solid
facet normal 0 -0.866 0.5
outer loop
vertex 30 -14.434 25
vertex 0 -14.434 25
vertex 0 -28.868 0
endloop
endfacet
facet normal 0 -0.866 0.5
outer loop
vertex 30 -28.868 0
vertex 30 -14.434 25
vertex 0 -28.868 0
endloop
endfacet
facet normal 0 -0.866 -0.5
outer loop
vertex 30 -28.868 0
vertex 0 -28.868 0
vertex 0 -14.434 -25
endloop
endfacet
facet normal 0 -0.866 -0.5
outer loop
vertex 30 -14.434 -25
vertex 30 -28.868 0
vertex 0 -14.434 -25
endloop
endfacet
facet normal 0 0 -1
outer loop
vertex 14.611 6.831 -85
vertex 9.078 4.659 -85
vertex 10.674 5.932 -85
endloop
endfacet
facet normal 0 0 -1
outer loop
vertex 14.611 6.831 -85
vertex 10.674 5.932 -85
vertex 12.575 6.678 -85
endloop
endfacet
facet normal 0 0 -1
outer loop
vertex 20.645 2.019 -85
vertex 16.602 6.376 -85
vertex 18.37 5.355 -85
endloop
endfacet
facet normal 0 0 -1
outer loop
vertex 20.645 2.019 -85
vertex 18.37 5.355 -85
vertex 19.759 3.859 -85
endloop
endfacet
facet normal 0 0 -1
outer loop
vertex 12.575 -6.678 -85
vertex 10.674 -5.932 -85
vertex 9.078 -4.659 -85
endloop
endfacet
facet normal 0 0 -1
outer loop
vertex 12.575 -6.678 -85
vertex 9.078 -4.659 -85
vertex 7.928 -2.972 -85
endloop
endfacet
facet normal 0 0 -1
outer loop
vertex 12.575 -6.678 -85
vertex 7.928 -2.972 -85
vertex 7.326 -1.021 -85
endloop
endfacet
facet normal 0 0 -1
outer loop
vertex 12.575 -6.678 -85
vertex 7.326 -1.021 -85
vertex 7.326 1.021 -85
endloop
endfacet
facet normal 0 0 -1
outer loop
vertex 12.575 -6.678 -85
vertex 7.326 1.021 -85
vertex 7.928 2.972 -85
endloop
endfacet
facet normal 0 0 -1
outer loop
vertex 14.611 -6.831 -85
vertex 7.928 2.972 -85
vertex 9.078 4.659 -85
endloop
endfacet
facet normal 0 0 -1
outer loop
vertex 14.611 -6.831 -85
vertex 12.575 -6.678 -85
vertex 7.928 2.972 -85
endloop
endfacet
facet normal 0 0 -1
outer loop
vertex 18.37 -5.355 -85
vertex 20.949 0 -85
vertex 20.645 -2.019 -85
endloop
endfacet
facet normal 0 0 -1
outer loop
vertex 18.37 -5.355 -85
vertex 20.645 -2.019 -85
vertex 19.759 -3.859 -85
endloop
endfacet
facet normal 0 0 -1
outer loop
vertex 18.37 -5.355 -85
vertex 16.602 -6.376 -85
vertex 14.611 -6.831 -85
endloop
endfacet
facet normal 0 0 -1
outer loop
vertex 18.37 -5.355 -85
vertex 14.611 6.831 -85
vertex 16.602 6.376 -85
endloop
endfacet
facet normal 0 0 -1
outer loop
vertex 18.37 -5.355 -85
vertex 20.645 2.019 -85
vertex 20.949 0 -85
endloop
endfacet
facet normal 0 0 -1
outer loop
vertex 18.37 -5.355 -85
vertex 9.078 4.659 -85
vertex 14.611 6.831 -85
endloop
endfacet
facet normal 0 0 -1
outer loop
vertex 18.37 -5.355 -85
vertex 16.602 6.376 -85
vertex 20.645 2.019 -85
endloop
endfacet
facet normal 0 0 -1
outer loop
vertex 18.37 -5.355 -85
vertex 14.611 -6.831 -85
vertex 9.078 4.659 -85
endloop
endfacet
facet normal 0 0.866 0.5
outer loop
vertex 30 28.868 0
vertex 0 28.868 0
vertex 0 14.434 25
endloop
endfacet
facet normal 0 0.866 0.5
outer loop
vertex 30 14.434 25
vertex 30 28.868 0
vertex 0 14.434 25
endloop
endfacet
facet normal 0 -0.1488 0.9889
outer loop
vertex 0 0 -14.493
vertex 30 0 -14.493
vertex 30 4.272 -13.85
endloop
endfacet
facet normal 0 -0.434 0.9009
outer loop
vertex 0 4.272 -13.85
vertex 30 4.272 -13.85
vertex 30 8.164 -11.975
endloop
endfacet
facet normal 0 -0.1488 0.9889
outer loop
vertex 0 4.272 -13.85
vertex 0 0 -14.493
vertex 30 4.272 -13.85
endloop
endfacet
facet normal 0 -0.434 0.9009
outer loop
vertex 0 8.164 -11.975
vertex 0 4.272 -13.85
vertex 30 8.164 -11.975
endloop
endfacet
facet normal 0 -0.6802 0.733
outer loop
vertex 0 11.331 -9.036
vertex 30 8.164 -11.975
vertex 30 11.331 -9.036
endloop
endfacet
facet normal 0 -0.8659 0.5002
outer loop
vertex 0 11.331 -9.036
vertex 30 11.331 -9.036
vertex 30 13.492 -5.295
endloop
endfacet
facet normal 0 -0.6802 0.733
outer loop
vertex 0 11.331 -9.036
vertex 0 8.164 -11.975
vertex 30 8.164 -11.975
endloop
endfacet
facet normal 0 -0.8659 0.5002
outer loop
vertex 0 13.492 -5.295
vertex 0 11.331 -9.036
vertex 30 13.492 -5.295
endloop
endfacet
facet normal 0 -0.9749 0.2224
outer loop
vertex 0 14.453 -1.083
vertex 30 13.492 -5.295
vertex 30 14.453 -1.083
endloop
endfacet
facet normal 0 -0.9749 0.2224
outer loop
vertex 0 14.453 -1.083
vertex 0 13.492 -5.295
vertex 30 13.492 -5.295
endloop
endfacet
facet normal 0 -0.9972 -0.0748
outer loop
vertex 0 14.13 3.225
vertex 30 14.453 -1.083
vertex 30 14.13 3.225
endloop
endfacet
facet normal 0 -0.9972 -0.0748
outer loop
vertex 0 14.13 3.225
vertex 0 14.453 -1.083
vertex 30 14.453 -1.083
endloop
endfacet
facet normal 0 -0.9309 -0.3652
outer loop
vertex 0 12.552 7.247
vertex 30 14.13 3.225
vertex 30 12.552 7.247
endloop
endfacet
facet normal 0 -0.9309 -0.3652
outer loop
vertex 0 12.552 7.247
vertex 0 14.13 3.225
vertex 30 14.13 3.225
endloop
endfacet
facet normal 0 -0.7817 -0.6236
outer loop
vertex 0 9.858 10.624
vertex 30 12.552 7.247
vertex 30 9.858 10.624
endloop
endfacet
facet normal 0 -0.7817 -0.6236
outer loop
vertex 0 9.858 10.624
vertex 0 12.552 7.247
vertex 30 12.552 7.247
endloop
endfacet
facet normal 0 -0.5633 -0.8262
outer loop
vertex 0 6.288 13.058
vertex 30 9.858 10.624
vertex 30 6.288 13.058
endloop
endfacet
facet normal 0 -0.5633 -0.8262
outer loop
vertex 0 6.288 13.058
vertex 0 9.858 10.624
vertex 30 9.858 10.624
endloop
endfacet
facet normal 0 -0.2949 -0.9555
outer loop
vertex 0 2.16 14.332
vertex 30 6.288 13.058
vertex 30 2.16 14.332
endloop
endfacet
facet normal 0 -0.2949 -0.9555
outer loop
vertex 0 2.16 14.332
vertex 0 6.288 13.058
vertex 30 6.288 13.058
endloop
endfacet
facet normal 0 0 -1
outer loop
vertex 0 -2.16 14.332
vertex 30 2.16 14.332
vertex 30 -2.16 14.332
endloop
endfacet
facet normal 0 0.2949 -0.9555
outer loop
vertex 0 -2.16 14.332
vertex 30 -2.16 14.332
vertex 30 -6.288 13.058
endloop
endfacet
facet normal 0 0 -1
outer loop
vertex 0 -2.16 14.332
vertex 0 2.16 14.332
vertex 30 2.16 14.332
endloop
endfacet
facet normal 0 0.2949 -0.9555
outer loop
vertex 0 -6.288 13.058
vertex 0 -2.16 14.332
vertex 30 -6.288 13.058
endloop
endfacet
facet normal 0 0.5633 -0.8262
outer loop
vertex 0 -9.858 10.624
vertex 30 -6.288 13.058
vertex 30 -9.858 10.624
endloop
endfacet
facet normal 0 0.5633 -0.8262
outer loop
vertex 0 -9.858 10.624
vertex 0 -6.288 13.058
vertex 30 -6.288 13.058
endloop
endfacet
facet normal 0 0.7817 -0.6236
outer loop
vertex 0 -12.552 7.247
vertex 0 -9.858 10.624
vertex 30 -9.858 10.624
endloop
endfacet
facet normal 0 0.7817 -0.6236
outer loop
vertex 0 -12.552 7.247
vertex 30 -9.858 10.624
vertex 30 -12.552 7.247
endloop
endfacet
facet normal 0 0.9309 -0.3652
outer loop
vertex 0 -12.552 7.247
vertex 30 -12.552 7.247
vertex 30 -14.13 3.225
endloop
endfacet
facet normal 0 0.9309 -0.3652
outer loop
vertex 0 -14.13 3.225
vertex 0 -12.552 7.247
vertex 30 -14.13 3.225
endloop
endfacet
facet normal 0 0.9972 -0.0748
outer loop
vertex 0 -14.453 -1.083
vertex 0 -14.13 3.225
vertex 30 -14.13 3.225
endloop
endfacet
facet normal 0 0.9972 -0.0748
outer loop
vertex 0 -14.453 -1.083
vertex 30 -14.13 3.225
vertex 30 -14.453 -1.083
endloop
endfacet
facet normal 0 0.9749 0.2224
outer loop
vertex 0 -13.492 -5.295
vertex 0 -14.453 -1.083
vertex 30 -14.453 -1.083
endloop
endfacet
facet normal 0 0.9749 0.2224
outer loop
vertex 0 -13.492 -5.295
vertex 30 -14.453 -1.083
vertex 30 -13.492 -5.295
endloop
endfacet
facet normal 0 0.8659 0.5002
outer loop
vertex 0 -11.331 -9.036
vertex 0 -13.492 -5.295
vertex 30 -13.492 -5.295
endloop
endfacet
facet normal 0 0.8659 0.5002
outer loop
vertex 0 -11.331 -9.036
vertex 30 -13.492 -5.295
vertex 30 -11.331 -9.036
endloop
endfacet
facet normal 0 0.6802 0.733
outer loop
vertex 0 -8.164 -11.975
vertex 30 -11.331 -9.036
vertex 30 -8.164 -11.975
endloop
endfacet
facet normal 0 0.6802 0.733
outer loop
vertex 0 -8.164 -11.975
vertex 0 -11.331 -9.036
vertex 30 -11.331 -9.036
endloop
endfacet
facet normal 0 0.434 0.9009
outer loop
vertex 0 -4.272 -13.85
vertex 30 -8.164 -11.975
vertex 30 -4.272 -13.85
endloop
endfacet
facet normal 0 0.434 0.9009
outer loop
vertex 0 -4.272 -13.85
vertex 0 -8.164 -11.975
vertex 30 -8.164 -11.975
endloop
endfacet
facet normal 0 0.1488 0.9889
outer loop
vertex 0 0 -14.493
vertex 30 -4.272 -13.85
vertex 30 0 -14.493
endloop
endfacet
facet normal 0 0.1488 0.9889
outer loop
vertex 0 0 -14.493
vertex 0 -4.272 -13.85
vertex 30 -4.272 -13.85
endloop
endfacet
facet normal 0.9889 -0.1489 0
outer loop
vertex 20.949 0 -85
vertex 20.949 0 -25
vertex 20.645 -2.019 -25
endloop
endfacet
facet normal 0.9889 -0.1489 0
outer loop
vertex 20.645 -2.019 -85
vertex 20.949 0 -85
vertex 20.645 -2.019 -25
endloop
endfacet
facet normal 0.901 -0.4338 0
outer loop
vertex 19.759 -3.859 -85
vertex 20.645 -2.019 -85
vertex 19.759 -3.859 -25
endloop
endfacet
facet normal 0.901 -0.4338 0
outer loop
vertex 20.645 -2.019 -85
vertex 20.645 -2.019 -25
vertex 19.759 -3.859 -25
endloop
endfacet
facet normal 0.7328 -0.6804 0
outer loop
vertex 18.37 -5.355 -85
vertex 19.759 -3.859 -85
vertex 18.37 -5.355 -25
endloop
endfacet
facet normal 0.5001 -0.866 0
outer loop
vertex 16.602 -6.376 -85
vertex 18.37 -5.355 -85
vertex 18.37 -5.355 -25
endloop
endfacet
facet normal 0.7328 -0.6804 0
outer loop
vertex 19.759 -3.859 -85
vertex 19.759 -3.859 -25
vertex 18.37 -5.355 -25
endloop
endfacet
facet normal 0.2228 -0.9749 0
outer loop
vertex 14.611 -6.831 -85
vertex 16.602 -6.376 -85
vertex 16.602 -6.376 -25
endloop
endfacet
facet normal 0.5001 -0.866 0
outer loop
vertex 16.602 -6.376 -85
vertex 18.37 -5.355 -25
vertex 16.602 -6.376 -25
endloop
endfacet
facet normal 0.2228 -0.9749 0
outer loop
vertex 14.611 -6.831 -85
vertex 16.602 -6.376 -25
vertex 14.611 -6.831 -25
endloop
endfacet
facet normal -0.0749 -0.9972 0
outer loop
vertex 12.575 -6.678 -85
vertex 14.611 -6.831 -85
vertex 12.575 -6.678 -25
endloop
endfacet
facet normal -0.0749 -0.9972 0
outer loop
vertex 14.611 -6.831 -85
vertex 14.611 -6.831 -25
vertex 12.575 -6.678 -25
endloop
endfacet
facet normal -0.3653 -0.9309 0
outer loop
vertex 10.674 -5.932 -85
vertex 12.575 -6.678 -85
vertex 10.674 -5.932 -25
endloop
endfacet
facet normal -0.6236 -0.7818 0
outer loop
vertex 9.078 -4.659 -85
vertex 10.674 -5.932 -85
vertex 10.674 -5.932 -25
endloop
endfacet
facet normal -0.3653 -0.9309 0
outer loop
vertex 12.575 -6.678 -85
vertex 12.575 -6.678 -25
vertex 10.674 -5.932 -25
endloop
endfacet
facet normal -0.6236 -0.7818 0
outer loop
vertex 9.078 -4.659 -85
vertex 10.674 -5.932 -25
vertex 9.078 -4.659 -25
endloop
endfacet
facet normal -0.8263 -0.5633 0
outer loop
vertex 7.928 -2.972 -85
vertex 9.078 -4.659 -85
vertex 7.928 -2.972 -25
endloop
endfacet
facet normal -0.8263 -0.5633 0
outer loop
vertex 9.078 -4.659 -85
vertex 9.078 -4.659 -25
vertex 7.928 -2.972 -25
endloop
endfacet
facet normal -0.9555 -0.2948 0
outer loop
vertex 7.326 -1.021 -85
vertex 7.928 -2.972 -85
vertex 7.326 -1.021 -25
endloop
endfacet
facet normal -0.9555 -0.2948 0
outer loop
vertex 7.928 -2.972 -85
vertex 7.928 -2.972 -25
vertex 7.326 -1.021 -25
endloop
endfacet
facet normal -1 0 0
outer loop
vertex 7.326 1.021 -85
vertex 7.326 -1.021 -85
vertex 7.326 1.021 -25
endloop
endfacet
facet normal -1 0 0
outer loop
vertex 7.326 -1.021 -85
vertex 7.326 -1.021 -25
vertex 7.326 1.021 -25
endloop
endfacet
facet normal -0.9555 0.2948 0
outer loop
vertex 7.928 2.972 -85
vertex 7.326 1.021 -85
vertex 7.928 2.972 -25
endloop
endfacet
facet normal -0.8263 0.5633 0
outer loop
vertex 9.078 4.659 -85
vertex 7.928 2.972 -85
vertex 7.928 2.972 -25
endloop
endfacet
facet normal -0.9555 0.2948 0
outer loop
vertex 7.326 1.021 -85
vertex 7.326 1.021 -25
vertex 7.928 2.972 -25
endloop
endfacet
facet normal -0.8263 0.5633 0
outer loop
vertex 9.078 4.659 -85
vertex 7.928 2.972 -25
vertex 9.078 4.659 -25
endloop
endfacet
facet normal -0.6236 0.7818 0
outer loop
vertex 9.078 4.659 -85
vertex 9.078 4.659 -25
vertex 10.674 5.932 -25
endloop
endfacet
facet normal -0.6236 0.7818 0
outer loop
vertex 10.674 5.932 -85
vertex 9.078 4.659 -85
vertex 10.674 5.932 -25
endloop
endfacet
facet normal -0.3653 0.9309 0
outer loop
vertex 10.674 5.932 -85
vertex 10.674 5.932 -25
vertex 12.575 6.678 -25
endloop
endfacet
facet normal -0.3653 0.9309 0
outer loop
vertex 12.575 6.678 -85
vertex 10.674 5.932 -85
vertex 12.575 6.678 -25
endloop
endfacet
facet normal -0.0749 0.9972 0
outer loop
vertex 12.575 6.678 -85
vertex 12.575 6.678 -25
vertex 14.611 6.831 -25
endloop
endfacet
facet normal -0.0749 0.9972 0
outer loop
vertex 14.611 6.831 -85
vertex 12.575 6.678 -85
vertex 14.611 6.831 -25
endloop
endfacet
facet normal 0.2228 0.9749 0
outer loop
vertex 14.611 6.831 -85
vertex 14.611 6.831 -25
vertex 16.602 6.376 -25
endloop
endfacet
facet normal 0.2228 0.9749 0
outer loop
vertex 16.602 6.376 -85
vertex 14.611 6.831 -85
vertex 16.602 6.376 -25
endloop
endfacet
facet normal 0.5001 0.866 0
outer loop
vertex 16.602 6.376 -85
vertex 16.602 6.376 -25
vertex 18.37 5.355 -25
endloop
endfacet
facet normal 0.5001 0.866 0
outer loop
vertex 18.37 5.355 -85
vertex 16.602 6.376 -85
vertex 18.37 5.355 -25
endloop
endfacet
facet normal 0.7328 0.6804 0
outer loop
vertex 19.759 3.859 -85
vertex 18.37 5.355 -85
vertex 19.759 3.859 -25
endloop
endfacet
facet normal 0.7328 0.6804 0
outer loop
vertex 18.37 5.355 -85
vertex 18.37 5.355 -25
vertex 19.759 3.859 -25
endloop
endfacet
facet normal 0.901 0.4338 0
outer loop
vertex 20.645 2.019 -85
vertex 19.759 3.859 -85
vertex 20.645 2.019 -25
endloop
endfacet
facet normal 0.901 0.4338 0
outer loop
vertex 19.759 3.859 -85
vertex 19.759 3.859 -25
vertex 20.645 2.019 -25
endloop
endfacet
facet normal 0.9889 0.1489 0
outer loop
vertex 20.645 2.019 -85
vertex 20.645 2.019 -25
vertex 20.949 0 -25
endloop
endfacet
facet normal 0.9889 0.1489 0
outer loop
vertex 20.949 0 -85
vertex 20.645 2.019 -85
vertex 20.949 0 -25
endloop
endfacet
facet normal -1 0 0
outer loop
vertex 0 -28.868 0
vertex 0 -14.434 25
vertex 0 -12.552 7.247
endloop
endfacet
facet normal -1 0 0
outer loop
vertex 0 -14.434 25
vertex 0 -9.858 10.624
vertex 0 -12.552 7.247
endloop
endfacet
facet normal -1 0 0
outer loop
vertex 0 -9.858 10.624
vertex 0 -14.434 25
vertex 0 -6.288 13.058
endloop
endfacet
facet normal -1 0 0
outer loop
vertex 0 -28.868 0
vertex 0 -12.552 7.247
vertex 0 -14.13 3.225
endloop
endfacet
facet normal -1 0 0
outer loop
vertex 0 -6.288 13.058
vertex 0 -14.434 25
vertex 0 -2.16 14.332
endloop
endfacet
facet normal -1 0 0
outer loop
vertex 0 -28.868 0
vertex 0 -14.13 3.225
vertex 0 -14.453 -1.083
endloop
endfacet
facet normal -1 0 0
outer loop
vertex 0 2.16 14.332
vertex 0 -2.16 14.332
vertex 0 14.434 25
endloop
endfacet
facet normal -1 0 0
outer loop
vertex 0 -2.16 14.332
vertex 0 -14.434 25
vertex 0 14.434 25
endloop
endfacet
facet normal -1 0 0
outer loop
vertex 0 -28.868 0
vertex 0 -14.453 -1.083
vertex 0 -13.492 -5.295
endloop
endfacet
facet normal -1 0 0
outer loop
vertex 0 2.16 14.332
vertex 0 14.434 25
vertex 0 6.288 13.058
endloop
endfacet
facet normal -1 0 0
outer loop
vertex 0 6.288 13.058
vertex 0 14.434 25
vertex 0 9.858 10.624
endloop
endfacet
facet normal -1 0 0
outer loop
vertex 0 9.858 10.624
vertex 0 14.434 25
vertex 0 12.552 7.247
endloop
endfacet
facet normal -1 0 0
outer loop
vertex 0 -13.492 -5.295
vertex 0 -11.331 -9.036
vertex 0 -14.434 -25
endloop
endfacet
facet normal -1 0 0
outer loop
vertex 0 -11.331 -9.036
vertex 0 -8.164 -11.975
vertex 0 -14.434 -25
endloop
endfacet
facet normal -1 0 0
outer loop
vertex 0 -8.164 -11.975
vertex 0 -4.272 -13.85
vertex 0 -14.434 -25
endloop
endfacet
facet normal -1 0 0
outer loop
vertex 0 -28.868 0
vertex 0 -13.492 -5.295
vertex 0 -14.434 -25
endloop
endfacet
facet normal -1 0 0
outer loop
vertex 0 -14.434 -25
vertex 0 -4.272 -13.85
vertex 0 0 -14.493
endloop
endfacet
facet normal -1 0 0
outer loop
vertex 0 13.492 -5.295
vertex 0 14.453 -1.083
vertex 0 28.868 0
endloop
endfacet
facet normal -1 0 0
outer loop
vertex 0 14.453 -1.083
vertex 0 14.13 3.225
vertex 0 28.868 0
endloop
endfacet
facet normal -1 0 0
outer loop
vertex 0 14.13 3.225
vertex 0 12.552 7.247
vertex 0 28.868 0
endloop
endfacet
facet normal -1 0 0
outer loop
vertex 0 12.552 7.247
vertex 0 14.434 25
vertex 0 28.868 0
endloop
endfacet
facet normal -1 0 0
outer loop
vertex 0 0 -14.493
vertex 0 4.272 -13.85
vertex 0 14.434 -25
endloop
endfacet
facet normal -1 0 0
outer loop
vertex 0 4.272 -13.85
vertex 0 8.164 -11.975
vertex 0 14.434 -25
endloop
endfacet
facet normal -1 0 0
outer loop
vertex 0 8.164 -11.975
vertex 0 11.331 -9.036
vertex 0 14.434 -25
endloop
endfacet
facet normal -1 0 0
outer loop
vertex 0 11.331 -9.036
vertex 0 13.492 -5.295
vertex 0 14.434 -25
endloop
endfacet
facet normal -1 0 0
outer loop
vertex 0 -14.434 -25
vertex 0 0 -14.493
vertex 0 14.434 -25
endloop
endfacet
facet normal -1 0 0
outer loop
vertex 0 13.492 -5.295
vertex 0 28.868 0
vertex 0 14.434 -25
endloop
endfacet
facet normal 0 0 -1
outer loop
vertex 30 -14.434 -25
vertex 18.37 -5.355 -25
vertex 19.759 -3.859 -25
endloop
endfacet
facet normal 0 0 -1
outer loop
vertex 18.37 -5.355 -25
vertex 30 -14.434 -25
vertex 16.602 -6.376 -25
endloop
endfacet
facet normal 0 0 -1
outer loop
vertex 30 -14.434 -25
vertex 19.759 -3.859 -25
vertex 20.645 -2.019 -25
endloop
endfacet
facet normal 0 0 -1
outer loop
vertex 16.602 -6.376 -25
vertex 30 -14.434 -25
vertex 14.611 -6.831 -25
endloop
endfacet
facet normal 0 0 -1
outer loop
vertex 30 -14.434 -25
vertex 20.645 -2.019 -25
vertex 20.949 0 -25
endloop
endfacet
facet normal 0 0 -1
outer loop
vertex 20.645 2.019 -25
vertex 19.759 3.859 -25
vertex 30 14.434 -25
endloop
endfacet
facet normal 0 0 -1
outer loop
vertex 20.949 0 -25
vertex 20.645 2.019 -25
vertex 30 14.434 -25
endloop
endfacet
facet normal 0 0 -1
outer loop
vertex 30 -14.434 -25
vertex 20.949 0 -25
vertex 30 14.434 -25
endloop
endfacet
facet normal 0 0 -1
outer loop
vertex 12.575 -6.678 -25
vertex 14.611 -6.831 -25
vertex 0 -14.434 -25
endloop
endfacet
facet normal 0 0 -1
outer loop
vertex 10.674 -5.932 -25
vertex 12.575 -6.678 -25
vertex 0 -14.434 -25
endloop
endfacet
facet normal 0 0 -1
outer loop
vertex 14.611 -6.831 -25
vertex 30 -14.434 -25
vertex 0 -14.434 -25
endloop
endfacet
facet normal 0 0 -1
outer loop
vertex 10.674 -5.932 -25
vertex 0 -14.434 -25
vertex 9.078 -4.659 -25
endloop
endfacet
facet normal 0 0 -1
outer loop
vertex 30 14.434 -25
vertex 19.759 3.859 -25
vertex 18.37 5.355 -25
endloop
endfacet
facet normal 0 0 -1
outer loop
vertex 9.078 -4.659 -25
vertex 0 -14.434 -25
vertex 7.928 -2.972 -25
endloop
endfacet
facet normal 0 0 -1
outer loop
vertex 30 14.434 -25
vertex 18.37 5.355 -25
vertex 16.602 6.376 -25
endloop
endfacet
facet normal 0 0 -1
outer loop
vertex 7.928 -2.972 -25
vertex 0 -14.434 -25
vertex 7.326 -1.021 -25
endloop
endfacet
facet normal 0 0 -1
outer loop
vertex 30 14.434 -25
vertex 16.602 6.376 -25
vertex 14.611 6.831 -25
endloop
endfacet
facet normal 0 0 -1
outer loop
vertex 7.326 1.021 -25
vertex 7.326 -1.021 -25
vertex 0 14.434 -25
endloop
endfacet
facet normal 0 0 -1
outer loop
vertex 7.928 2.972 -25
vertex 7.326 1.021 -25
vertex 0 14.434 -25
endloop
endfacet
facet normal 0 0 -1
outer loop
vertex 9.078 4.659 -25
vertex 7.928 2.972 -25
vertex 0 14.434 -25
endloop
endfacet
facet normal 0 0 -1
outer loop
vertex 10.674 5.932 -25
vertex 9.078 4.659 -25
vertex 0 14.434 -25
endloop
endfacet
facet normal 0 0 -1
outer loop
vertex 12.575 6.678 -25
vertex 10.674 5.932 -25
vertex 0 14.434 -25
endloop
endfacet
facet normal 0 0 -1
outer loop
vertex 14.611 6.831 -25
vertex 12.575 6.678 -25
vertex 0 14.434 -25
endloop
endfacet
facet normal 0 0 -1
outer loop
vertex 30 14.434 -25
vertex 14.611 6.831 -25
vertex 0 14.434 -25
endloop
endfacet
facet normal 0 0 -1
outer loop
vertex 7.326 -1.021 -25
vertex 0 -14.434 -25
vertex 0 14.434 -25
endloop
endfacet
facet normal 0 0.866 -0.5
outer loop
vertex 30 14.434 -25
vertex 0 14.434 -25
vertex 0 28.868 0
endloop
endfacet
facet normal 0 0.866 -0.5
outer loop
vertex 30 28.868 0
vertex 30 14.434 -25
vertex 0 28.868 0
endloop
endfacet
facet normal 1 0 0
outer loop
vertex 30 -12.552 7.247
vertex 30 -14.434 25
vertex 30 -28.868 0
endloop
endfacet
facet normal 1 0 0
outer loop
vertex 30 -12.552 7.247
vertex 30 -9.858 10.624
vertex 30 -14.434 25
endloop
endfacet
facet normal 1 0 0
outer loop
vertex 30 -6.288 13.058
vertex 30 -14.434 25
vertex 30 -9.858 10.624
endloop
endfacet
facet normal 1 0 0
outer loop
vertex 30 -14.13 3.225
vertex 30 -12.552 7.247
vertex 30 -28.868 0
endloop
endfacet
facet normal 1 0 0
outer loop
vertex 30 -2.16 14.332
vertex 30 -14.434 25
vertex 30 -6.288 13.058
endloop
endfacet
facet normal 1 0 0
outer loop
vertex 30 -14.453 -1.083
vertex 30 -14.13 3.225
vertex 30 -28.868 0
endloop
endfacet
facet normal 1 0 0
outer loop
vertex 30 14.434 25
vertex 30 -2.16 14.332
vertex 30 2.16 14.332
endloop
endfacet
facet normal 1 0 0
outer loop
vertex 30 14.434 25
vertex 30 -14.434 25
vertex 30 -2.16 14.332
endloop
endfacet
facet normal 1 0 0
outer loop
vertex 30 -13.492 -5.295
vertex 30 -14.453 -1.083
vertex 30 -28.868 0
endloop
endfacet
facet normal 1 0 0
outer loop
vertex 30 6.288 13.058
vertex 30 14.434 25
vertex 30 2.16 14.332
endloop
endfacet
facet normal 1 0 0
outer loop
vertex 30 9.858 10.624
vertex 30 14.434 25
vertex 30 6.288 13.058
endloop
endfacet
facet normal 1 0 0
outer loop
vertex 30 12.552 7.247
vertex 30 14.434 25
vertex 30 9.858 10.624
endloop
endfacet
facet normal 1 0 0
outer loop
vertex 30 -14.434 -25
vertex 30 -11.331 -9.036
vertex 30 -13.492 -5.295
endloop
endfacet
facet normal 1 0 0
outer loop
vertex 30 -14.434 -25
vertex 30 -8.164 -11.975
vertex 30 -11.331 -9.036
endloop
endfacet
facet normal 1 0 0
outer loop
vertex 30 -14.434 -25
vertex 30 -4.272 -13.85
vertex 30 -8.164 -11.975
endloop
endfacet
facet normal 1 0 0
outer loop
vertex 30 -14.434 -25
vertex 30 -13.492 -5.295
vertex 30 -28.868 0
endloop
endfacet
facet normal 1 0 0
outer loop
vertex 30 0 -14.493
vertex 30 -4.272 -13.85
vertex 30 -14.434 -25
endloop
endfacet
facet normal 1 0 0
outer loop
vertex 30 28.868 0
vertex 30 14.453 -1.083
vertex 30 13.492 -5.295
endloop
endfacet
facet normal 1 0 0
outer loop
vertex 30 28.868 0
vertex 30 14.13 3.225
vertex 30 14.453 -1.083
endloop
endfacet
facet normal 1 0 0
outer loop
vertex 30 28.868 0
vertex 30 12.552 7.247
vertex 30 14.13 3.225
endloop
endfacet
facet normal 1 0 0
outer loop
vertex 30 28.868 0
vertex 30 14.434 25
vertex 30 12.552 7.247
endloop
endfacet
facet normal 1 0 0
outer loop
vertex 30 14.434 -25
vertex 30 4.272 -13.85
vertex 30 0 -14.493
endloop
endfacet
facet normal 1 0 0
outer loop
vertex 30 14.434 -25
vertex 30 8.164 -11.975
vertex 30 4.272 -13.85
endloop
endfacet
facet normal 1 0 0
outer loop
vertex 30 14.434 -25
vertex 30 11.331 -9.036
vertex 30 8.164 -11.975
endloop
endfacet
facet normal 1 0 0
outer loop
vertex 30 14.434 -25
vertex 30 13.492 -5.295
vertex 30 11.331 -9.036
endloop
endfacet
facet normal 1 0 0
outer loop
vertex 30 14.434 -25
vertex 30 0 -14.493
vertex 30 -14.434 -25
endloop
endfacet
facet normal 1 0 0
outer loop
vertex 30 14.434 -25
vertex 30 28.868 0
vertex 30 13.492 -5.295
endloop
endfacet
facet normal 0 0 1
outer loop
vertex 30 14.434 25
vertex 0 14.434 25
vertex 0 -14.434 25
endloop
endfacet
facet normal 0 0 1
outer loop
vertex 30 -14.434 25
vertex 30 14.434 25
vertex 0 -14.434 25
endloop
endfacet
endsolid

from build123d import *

# Parameters (mm, degrees)
CROQUIS1_R              = 14.493410581
SALIENTE_EXTRUIR1_DEPTH = 30
CROQUIS2_R              = 6.849720654
SALIENTE_EXTRUIR2_DEPTH = 60


with BuildPart() as part:
    # Croquis1 → Saliente-Extruir1 (new body)
    with BuildSketch(Plane(origin=(0, 0, 0), x_dir=(0, 0, -1), z_dir=(1, 0, 0))):
        Polygon((25, 14.43375673), (0, 28.867513459), (-25, 14.43375673), (-25, -14.43375673), (0, -28.867513459), (25, -14.43375673), align=None)
        Circle(CROQUIS1_R, mode=Mode.SUBTRACT)
    extrude(amount=SALIENTE_EXTRUIR1_DEPTH)

    # Croquis2 → Saliente-Extruir2 (add)
    with BuildSketch(Plane(origin=(0, 0, -25), x_dir=(-1, 0, 0), z_dir=(0, 0, -1))):
        with Locations(Location((-14.099346636, 0, 0), (0, 0, 180))):
            Circle(CROQUIS2_R)
    extrude(amount=SALIENTE_EXTRUIR2_DEPTH)


solid = part.part
